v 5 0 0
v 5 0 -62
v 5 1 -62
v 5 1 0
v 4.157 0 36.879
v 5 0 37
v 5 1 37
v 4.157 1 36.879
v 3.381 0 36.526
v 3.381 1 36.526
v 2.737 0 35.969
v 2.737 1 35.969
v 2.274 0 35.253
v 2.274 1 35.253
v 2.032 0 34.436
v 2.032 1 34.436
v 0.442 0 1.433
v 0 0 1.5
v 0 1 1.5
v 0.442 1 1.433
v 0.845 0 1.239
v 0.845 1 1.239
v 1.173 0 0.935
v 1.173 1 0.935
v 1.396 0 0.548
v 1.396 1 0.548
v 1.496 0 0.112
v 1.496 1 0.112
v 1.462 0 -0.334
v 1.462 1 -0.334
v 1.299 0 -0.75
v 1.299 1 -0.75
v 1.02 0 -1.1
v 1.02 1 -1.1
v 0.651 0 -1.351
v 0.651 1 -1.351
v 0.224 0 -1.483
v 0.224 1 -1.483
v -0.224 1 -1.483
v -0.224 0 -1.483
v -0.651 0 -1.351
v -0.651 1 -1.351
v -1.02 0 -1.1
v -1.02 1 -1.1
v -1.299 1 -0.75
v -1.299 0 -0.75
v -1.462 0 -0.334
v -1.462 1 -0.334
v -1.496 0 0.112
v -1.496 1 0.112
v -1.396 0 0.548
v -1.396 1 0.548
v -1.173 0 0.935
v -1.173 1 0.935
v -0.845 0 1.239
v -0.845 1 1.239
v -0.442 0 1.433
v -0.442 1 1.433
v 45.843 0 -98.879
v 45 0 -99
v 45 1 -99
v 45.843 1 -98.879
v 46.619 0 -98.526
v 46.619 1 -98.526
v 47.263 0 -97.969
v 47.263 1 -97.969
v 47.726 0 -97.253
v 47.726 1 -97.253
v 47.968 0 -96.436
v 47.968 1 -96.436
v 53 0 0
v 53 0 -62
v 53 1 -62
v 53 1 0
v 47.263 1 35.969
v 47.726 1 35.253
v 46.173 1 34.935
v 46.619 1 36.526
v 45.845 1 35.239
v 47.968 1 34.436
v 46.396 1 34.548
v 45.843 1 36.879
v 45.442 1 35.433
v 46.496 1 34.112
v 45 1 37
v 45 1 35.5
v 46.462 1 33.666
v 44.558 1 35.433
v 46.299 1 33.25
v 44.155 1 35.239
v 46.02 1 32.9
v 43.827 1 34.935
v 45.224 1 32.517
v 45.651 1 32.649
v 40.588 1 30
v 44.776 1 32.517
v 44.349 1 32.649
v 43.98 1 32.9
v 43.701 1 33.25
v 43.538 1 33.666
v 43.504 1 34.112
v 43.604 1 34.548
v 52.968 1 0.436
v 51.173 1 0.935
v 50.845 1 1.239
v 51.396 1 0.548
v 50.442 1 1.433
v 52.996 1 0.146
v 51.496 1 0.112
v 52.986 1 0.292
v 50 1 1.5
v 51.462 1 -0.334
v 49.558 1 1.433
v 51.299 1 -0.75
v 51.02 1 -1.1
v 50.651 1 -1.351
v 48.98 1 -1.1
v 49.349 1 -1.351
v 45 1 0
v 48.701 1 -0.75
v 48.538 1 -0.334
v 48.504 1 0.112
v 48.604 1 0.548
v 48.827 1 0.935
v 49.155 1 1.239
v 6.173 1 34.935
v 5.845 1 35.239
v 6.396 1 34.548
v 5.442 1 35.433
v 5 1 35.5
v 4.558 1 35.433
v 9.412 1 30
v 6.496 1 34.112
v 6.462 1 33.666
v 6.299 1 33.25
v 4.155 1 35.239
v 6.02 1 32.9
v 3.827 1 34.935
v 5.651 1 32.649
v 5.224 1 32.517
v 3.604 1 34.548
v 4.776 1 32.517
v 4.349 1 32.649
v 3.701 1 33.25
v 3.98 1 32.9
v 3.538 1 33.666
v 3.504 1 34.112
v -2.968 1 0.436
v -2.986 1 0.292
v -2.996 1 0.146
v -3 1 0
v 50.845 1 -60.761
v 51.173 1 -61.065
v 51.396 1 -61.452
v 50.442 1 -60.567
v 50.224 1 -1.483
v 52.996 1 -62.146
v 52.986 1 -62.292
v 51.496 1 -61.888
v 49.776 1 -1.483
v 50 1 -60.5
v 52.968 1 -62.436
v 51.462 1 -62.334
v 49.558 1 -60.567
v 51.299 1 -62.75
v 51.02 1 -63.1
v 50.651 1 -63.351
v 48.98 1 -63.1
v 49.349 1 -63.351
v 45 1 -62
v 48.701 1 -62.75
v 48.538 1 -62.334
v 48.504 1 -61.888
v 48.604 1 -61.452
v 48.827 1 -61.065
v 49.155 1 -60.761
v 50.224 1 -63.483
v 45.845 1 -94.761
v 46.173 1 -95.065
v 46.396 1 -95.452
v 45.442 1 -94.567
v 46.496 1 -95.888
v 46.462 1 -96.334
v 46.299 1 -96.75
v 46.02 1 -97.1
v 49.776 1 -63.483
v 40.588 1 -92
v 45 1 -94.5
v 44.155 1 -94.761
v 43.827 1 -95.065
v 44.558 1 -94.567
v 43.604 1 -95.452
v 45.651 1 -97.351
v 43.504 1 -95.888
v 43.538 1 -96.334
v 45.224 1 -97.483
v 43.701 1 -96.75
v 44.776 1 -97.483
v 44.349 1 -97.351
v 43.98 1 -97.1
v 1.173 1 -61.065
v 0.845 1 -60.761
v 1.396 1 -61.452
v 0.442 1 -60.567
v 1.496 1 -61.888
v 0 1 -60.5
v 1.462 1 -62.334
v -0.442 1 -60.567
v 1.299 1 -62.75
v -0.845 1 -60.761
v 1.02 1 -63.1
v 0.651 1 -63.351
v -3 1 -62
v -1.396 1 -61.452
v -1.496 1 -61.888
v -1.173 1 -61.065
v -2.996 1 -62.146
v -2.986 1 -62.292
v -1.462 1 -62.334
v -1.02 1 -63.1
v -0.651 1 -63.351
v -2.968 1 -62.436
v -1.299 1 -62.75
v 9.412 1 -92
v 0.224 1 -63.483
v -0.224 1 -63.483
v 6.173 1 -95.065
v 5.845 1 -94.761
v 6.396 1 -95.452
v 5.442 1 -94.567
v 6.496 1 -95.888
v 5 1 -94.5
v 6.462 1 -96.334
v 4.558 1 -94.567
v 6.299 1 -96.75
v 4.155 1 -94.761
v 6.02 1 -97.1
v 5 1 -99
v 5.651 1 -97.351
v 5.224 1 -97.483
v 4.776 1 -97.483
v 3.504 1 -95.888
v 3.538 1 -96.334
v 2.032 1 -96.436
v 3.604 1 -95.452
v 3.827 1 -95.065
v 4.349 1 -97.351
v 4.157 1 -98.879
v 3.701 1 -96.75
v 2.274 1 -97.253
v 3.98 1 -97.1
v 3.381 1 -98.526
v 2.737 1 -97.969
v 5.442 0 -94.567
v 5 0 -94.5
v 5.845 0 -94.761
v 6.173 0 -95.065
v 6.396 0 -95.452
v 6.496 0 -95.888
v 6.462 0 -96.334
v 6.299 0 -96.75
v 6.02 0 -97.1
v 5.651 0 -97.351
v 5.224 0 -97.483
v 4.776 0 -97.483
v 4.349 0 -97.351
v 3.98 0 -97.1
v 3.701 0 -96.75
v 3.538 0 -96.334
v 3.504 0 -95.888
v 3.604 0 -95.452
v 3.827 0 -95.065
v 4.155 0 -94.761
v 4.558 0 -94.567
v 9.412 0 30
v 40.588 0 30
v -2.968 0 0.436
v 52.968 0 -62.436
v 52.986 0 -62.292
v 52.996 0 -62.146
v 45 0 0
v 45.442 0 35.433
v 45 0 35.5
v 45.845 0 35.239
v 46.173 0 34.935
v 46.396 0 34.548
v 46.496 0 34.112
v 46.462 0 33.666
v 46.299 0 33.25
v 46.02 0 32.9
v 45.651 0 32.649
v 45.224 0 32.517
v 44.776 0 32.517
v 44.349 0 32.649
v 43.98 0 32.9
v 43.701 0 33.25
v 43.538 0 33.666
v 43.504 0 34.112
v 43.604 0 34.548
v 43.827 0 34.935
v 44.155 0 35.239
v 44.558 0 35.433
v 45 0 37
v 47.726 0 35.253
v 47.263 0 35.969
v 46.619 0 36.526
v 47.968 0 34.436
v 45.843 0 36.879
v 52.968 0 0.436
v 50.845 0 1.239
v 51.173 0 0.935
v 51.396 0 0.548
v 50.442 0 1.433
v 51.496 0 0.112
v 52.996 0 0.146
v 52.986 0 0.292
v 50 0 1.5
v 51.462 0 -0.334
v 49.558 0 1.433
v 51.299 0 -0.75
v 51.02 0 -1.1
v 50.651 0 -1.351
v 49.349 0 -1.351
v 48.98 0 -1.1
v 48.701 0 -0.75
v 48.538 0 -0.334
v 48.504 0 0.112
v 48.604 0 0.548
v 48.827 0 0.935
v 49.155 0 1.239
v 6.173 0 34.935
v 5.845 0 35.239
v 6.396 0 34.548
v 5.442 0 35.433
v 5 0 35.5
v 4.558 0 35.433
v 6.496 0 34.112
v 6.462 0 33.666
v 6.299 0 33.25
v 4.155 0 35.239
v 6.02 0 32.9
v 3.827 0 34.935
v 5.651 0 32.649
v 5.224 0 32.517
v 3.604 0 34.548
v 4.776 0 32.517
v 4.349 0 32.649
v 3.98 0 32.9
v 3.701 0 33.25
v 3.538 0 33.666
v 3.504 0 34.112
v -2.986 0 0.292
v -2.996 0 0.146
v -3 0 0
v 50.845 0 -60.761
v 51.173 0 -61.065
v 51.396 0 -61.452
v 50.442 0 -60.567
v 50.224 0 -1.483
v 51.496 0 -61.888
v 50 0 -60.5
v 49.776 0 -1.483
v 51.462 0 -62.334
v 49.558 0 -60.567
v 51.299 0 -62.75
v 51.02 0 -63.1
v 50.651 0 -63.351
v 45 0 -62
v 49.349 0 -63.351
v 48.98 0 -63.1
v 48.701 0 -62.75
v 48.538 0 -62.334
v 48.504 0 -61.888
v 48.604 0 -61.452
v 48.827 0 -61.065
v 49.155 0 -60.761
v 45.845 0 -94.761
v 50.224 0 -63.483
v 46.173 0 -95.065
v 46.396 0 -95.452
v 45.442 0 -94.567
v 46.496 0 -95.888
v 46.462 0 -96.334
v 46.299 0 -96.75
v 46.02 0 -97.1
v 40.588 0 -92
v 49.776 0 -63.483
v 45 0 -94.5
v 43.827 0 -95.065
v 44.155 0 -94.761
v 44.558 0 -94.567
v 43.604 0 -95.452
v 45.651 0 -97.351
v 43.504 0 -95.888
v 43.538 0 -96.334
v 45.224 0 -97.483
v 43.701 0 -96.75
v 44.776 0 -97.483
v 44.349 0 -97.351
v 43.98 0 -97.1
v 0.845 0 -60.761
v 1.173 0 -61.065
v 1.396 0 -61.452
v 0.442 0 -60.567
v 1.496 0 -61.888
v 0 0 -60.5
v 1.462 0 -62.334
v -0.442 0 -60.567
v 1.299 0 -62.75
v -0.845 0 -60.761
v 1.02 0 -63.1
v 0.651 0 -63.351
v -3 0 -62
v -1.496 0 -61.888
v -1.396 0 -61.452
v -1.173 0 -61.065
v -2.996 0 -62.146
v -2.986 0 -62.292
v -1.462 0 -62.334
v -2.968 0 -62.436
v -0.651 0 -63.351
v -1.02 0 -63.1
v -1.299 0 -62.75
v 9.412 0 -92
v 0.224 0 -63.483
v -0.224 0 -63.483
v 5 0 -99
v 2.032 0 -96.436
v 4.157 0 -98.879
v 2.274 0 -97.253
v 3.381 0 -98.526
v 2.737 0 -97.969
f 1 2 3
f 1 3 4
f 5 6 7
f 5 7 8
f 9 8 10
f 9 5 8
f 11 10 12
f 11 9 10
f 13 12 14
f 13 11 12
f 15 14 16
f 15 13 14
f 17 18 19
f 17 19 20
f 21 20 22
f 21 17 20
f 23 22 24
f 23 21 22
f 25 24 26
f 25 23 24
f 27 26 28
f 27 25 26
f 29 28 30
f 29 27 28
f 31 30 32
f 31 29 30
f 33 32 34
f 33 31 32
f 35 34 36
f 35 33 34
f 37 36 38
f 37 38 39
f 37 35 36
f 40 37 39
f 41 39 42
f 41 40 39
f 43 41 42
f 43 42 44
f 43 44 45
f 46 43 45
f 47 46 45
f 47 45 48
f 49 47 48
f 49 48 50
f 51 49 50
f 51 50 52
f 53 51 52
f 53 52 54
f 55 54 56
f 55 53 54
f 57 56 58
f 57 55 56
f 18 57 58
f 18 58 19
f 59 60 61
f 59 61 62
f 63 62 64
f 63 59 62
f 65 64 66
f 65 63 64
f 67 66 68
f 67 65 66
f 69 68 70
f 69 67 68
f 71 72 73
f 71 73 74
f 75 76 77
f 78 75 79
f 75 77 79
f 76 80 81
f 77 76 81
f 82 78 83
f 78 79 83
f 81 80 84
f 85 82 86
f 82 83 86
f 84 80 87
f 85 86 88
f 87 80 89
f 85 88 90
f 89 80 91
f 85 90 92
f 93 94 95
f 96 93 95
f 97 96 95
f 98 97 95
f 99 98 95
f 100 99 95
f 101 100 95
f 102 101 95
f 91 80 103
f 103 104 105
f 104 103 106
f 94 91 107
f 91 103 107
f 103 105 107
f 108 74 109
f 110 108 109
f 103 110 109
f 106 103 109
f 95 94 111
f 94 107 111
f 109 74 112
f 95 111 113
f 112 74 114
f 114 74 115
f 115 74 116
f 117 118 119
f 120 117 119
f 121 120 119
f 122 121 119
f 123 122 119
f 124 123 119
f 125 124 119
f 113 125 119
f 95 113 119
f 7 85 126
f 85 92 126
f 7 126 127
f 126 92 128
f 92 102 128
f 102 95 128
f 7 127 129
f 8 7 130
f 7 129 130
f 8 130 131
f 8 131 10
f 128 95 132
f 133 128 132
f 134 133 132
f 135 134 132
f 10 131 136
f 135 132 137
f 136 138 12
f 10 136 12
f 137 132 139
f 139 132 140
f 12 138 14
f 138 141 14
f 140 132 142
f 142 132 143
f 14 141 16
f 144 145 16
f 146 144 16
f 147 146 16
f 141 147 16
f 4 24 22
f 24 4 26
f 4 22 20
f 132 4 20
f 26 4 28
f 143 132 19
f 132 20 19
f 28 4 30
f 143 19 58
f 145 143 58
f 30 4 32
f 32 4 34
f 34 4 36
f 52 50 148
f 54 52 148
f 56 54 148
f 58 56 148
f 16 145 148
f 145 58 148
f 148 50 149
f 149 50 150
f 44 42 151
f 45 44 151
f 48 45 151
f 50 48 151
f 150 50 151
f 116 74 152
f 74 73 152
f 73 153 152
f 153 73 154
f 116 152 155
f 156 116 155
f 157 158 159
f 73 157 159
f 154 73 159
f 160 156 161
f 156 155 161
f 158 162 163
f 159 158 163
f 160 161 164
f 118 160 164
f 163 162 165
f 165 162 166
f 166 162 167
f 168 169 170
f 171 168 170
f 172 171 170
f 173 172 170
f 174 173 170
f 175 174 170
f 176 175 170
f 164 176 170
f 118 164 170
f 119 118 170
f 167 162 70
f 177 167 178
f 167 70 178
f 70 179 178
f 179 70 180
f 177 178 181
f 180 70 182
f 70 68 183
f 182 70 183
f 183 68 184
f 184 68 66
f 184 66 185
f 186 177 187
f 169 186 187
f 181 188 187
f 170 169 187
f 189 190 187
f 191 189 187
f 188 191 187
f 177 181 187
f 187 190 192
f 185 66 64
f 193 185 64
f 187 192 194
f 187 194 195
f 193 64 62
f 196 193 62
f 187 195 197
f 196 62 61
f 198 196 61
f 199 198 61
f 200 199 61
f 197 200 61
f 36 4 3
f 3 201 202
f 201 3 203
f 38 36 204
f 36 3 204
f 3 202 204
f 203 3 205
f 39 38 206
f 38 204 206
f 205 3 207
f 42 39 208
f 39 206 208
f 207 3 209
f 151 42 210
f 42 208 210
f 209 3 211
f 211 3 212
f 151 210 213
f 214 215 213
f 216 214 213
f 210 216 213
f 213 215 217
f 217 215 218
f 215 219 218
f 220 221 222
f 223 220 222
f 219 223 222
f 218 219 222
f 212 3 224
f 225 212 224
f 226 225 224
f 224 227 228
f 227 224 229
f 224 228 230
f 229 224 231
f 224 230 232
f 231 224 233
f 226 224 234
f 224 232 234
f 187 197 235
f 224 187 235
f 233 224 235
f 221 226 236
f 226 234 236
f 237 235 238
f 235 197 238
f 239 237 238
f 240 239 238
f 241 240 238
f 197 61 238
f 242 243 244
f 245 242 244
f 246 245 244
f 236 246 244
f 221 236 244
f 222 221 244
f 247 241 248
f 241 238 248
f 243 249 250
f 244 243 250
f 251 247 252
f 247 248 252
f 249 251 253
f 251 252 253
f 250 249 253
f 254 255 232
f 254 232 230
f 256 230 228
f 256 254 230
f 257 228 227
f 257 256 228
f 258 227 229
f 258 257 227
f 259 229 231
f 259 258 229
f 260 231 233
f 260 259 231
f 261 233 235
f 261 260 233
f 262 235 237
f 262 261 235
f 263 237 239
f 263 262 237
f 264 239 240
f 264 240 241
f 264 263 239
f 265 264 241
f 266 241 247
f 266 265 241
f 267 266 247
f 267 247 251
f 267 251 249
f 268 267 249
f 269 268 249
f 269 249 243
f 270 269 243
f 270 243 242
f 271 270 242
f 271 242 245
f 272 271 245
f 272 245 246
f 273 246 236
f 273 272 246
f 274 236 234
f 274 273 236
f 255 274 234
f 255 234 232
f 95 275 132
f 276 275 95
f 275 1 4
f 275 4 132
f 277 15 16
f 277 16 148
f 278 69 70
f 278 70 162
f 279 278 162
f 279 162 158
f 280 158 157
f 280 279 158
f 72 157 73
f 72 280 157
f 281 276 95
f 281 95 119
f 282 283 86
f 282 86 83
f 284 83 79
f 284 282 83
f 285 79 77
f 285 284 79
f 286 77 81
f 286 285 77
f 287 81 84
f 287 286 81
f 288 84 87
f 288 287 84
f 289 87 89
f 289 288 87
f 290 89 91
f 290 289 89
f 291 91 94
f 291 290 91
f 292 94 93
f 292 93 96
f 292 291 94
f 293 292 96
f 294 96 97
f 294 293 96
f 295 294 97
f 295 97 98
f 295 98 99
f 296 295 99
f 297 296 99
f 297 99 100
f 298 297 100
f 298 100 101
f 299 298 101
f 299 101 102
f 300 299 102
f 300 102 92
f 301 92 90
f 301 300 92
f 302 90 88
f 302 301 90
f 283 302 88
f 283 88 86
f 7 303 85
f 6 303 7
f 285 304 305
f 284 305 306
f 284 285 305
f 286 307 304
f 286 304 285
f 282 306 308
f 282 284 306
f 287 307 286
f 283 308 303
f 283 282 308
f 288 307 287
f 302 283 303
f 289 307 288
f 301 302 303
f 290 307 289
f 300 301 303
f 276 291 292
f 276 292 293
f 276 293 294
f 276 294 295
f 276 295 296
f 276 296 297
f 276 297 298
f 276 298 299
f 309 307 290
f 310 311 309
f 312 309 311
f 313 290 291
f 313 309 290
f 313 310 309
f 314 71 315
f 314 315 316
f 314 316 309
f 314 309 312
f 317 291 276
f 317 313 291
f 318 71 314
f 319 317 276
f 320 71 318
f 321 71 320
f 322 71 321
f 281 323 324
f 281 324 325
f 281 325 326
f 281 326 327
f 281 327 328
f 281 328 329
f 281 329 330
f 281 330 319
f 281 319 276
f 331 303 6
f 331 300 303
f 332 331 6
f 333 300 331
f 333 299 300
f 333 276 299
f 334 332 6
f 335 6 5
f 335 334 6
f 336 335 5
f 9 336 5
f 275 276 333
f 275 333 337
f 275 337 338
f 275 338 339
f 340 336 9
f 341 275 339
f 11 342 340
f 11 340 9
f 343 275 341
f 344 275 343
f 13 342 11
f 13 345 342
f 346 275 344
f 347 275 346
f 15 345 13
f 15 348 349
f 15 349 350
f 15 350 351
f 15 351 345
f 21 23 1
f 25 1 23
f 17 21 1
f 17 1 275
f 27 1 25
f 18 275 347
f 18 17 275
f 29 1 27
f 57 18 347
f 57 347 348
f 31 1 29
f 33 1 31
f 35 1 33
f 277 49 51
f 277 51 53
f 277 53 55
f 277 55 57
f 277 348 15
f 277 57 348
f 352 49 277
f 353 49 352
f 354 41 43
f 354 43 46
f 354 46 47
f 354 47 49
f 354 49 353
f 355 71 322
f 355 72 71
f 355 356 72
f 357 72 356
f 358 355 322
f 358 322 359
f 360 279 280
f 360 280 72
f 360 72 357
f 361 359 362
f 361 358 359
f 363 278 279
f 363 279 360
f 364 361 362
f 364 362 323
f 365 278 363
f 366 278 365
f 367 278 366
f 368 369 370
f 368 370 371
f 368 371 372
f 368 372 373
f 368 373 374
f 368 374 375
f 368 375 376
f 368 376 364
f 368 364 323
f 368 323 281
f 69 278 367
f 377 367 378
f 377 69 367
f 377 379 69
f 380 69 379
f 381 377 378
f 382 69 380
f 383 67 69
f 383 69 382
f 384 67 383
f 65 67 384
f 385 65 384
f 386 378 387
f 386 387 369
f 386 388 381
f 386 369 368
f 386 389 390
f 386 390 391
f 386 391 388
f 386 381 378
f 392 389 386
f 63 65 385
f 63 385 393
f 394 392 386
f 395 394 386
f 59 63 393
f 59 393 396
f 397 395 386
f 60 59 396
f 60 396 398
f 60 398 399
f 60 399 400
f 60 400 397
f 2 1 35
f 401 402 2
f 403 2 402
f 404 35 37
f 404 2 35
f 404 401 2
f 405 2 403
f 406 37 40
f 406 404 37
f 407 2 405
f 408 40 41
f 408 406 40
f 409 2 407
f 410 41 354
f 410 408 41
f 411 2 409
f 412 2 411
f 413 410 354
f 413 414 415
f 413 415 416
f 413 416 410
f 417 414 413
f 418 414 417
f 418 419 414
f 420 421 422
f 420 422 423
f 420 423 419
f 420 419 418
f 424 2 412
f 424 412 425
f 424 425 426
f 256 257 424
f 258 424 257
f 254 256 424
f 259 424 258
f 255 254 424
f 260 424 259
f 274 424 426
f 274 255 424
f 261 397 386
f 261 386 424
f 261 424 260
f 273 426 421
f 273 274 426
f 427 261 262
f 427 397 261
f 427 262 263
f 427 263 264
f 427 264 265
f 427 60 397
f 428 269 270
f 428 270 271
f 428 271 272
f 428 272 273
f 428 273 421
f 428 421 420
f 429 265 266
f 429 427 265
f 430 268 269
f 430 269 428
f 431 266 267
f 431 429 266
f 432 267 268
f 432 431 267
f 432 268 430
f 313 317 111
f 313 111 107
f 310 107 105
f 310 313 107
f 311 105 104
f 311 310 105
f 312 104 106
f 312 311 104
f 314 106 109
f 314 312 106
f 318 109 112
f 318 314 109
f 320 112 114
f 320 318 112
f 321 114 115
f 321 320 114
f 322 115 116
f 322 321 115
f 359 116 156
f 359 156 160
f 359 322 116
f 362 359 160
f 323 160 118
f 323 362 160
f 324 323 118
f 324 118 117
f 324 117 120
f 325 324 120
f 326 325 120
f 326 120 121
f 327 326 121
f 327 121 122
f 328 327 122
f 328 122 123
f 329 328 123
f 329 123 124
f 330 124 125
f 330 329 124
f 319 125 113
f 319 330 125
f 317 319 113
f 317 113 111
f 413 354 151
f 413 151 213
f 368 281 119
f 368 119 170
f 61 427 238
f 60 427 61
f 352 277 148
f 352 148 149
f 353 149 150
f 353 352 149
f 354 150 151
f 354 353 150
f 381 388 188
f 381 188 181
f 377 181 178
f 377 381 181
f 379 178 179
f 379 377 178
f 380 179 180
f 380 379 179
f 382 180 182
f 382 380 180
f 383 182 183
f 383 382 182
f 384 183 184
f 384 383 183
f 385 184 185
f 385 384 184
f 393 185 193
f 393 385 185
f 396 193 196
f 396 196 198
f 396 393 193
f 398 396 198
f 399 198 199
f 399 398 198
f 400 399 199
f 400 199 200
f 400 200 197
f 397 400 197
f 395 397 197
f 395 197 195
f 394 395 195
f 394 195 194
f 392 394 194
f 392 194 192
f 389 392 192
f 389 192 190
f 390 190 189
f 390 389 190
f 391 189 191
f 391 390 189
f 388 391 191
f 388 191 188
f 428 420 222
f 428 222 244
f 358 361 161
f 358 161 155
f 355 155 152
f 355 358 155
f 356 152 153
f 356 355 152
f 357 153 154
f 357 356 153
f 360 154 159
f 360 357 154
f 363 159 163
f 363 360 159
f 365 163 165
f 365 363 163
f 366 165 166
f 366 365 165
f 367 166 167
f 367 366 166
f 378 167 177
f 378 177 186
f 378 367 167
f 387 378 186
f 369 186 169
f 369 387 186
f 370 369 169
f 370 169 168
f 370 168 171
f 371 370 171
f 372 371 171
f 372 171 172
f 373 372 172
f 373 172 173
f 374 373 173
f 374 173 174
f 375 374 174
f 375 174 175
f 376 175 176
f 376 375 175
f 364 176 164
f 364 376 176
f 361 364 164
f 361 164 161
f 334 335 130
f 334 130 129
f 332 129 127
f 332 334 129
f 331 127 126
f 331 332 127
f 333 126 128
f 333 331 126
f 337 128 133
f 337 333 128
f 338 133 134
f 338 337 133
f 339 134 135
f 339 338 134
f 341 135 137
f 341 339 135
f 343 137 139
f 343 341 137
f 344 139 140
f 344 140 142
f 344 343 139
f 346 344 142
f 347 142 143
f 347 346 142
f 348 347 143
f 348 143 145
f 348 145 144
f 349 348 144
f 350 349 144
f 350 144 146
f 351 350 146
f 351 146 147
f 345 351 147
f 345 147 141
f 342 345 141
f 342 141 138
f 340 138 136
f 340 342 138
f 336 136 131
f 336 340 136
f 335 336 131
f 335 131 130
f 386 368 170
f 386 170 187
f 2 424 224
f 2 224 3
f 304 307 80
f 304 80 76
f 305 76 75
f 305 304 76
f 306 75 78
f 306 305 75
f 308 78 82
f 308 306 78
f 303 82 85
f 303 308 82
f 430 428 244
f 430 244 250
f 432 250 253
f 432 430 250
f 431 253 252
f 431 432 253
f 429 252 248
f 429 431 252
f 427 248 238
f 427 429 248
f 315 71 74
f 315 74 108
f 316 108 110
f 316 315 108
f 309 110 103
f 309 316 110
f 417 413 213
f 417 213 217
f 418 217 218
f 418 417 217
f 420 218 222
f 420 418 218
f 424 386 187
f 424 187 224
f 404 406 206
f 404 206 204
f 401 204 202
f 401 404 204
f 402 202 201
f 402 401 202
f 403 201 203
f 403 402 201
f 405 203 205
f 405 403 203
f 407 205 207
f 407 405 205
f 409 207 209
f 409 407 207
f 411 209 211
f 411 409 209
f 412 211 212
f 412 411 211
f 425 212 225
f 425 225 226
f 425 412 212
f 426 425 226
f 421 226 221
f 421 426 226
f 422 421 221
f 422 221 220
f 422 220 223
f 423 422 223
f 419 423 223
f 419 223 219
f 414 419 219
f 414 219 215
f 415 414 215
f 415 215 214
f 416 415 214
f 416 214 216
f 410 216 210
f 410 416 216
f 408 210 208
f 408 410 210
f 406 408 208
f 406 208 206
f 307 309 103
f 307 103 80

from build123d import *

# Parameters (mm, degrees)
SKETCH_1_R      = 1.5
EXTRUDE_1_DEPTH = 1


with BuildPart() as part:
    # 草图1 → 凸台-拉伸1 (new body)
    with BuildSketch(Plane(origin=(0, 0, 0), x_dir=(1, 0, 0), z_dir=(0, 1, 0))):
        with BuildLine():
            Line((5, 99), (45, 99))
            ThreePointArc((45, 99), (46.960937797, 98.270401497), (47.968077406, 96.436481971))
            Line((47.968077406, 96.436481971), (52.968077406, 62.436481971))
            ThreePointArc((52.968077406, 62.436481971), (52.992008708, 62.218823881), (53, 62))
            Line((53, 62), (53, 0))
            ThreePointArc((53, 0), (52.992008708, -0.218823881), (52.968077406, -0.436481971))
            Line((52.968077406, -0.436481971), (47.968077406, -34.436481971))
            ThreePointArc((47.968077406, -34.436481971), (46.960937797, -36.270401497), (45, -37))
            Line((45, -37), (5, -37))
            ThreePointArc((5, -37), (3.039062203, -36.270401497), (2.031922594, -34.436481971))
            Line((2.031922594, -34.436481971), (-2.968077406, -0.436481971))
            ThreePointArc((-2.968077406, -0.436481971), (-2.992008708, -0.218823881), (-3, 0))
            Line((-3, 0), (-3, 62))
            ThreePointArc((-3, 62), (-2.992008708, 62.218823881), (-2.968077406, 62.436481971))
            Line((-2.968077406, 62.436481971), (2.031922594, 96.436481971))
            ThreePointArc((2.031922594, 96.436481971), (3.039062203, 98.270401497), (5, 99))
        make_face()
        with Locations(Location((0, 62, 0), (0, 0, 270))):
            Circle(SKETCH_1_R, mode=Mode.SUBTRACT)
        with Locations(Location((50, 62, 0), (0, 0, 270))):
            Circle(SKETCH_1_R, mode=Mode.SUBTRACT)
        with Locations(Location((0, 0, 0), (0, 0, 270))):
            Circle(SKETCH_1_R, mode=Mode.SUBTRACT)
        with Locations(Location((50, 0, 0), (0, 0, 270))):
            Circle(SKETCH_1_R, mode=Mode.SUBTRACT)
        with Locations(Location((5, 96, 0), (0, 0, 270))):
            Circle(SKETCH_1_R, mode=Mode.SUBTRACT)
        with Locations(Location((45, 96, 0), (0, 0, 270))):
            Circle(SKETCH_1_R, mode=Mode.SUBTRACT)
        with Locations(Location((5, -34, 0), (0, 0, 270))):
            Circle(SKETCH_1_R, mode=Mode.SUBTRACT)
        with Locations(Location((45, -34, 0), (0, 0, 270))):
            Circle(SKETCH_1_R, mode=Mode.SUBTRACT)
        Polygon((9.411764706, 92), (5, 62), (5, 0), (9.411764706, -30), (40.588235294, -30), (45, 0), (45, 62), (40.588235294, 92), align=None, mode=Mode.SUBTRACT)
    extrude(amount=EXTRUDE_1_DEPTH)


solid = part.part
